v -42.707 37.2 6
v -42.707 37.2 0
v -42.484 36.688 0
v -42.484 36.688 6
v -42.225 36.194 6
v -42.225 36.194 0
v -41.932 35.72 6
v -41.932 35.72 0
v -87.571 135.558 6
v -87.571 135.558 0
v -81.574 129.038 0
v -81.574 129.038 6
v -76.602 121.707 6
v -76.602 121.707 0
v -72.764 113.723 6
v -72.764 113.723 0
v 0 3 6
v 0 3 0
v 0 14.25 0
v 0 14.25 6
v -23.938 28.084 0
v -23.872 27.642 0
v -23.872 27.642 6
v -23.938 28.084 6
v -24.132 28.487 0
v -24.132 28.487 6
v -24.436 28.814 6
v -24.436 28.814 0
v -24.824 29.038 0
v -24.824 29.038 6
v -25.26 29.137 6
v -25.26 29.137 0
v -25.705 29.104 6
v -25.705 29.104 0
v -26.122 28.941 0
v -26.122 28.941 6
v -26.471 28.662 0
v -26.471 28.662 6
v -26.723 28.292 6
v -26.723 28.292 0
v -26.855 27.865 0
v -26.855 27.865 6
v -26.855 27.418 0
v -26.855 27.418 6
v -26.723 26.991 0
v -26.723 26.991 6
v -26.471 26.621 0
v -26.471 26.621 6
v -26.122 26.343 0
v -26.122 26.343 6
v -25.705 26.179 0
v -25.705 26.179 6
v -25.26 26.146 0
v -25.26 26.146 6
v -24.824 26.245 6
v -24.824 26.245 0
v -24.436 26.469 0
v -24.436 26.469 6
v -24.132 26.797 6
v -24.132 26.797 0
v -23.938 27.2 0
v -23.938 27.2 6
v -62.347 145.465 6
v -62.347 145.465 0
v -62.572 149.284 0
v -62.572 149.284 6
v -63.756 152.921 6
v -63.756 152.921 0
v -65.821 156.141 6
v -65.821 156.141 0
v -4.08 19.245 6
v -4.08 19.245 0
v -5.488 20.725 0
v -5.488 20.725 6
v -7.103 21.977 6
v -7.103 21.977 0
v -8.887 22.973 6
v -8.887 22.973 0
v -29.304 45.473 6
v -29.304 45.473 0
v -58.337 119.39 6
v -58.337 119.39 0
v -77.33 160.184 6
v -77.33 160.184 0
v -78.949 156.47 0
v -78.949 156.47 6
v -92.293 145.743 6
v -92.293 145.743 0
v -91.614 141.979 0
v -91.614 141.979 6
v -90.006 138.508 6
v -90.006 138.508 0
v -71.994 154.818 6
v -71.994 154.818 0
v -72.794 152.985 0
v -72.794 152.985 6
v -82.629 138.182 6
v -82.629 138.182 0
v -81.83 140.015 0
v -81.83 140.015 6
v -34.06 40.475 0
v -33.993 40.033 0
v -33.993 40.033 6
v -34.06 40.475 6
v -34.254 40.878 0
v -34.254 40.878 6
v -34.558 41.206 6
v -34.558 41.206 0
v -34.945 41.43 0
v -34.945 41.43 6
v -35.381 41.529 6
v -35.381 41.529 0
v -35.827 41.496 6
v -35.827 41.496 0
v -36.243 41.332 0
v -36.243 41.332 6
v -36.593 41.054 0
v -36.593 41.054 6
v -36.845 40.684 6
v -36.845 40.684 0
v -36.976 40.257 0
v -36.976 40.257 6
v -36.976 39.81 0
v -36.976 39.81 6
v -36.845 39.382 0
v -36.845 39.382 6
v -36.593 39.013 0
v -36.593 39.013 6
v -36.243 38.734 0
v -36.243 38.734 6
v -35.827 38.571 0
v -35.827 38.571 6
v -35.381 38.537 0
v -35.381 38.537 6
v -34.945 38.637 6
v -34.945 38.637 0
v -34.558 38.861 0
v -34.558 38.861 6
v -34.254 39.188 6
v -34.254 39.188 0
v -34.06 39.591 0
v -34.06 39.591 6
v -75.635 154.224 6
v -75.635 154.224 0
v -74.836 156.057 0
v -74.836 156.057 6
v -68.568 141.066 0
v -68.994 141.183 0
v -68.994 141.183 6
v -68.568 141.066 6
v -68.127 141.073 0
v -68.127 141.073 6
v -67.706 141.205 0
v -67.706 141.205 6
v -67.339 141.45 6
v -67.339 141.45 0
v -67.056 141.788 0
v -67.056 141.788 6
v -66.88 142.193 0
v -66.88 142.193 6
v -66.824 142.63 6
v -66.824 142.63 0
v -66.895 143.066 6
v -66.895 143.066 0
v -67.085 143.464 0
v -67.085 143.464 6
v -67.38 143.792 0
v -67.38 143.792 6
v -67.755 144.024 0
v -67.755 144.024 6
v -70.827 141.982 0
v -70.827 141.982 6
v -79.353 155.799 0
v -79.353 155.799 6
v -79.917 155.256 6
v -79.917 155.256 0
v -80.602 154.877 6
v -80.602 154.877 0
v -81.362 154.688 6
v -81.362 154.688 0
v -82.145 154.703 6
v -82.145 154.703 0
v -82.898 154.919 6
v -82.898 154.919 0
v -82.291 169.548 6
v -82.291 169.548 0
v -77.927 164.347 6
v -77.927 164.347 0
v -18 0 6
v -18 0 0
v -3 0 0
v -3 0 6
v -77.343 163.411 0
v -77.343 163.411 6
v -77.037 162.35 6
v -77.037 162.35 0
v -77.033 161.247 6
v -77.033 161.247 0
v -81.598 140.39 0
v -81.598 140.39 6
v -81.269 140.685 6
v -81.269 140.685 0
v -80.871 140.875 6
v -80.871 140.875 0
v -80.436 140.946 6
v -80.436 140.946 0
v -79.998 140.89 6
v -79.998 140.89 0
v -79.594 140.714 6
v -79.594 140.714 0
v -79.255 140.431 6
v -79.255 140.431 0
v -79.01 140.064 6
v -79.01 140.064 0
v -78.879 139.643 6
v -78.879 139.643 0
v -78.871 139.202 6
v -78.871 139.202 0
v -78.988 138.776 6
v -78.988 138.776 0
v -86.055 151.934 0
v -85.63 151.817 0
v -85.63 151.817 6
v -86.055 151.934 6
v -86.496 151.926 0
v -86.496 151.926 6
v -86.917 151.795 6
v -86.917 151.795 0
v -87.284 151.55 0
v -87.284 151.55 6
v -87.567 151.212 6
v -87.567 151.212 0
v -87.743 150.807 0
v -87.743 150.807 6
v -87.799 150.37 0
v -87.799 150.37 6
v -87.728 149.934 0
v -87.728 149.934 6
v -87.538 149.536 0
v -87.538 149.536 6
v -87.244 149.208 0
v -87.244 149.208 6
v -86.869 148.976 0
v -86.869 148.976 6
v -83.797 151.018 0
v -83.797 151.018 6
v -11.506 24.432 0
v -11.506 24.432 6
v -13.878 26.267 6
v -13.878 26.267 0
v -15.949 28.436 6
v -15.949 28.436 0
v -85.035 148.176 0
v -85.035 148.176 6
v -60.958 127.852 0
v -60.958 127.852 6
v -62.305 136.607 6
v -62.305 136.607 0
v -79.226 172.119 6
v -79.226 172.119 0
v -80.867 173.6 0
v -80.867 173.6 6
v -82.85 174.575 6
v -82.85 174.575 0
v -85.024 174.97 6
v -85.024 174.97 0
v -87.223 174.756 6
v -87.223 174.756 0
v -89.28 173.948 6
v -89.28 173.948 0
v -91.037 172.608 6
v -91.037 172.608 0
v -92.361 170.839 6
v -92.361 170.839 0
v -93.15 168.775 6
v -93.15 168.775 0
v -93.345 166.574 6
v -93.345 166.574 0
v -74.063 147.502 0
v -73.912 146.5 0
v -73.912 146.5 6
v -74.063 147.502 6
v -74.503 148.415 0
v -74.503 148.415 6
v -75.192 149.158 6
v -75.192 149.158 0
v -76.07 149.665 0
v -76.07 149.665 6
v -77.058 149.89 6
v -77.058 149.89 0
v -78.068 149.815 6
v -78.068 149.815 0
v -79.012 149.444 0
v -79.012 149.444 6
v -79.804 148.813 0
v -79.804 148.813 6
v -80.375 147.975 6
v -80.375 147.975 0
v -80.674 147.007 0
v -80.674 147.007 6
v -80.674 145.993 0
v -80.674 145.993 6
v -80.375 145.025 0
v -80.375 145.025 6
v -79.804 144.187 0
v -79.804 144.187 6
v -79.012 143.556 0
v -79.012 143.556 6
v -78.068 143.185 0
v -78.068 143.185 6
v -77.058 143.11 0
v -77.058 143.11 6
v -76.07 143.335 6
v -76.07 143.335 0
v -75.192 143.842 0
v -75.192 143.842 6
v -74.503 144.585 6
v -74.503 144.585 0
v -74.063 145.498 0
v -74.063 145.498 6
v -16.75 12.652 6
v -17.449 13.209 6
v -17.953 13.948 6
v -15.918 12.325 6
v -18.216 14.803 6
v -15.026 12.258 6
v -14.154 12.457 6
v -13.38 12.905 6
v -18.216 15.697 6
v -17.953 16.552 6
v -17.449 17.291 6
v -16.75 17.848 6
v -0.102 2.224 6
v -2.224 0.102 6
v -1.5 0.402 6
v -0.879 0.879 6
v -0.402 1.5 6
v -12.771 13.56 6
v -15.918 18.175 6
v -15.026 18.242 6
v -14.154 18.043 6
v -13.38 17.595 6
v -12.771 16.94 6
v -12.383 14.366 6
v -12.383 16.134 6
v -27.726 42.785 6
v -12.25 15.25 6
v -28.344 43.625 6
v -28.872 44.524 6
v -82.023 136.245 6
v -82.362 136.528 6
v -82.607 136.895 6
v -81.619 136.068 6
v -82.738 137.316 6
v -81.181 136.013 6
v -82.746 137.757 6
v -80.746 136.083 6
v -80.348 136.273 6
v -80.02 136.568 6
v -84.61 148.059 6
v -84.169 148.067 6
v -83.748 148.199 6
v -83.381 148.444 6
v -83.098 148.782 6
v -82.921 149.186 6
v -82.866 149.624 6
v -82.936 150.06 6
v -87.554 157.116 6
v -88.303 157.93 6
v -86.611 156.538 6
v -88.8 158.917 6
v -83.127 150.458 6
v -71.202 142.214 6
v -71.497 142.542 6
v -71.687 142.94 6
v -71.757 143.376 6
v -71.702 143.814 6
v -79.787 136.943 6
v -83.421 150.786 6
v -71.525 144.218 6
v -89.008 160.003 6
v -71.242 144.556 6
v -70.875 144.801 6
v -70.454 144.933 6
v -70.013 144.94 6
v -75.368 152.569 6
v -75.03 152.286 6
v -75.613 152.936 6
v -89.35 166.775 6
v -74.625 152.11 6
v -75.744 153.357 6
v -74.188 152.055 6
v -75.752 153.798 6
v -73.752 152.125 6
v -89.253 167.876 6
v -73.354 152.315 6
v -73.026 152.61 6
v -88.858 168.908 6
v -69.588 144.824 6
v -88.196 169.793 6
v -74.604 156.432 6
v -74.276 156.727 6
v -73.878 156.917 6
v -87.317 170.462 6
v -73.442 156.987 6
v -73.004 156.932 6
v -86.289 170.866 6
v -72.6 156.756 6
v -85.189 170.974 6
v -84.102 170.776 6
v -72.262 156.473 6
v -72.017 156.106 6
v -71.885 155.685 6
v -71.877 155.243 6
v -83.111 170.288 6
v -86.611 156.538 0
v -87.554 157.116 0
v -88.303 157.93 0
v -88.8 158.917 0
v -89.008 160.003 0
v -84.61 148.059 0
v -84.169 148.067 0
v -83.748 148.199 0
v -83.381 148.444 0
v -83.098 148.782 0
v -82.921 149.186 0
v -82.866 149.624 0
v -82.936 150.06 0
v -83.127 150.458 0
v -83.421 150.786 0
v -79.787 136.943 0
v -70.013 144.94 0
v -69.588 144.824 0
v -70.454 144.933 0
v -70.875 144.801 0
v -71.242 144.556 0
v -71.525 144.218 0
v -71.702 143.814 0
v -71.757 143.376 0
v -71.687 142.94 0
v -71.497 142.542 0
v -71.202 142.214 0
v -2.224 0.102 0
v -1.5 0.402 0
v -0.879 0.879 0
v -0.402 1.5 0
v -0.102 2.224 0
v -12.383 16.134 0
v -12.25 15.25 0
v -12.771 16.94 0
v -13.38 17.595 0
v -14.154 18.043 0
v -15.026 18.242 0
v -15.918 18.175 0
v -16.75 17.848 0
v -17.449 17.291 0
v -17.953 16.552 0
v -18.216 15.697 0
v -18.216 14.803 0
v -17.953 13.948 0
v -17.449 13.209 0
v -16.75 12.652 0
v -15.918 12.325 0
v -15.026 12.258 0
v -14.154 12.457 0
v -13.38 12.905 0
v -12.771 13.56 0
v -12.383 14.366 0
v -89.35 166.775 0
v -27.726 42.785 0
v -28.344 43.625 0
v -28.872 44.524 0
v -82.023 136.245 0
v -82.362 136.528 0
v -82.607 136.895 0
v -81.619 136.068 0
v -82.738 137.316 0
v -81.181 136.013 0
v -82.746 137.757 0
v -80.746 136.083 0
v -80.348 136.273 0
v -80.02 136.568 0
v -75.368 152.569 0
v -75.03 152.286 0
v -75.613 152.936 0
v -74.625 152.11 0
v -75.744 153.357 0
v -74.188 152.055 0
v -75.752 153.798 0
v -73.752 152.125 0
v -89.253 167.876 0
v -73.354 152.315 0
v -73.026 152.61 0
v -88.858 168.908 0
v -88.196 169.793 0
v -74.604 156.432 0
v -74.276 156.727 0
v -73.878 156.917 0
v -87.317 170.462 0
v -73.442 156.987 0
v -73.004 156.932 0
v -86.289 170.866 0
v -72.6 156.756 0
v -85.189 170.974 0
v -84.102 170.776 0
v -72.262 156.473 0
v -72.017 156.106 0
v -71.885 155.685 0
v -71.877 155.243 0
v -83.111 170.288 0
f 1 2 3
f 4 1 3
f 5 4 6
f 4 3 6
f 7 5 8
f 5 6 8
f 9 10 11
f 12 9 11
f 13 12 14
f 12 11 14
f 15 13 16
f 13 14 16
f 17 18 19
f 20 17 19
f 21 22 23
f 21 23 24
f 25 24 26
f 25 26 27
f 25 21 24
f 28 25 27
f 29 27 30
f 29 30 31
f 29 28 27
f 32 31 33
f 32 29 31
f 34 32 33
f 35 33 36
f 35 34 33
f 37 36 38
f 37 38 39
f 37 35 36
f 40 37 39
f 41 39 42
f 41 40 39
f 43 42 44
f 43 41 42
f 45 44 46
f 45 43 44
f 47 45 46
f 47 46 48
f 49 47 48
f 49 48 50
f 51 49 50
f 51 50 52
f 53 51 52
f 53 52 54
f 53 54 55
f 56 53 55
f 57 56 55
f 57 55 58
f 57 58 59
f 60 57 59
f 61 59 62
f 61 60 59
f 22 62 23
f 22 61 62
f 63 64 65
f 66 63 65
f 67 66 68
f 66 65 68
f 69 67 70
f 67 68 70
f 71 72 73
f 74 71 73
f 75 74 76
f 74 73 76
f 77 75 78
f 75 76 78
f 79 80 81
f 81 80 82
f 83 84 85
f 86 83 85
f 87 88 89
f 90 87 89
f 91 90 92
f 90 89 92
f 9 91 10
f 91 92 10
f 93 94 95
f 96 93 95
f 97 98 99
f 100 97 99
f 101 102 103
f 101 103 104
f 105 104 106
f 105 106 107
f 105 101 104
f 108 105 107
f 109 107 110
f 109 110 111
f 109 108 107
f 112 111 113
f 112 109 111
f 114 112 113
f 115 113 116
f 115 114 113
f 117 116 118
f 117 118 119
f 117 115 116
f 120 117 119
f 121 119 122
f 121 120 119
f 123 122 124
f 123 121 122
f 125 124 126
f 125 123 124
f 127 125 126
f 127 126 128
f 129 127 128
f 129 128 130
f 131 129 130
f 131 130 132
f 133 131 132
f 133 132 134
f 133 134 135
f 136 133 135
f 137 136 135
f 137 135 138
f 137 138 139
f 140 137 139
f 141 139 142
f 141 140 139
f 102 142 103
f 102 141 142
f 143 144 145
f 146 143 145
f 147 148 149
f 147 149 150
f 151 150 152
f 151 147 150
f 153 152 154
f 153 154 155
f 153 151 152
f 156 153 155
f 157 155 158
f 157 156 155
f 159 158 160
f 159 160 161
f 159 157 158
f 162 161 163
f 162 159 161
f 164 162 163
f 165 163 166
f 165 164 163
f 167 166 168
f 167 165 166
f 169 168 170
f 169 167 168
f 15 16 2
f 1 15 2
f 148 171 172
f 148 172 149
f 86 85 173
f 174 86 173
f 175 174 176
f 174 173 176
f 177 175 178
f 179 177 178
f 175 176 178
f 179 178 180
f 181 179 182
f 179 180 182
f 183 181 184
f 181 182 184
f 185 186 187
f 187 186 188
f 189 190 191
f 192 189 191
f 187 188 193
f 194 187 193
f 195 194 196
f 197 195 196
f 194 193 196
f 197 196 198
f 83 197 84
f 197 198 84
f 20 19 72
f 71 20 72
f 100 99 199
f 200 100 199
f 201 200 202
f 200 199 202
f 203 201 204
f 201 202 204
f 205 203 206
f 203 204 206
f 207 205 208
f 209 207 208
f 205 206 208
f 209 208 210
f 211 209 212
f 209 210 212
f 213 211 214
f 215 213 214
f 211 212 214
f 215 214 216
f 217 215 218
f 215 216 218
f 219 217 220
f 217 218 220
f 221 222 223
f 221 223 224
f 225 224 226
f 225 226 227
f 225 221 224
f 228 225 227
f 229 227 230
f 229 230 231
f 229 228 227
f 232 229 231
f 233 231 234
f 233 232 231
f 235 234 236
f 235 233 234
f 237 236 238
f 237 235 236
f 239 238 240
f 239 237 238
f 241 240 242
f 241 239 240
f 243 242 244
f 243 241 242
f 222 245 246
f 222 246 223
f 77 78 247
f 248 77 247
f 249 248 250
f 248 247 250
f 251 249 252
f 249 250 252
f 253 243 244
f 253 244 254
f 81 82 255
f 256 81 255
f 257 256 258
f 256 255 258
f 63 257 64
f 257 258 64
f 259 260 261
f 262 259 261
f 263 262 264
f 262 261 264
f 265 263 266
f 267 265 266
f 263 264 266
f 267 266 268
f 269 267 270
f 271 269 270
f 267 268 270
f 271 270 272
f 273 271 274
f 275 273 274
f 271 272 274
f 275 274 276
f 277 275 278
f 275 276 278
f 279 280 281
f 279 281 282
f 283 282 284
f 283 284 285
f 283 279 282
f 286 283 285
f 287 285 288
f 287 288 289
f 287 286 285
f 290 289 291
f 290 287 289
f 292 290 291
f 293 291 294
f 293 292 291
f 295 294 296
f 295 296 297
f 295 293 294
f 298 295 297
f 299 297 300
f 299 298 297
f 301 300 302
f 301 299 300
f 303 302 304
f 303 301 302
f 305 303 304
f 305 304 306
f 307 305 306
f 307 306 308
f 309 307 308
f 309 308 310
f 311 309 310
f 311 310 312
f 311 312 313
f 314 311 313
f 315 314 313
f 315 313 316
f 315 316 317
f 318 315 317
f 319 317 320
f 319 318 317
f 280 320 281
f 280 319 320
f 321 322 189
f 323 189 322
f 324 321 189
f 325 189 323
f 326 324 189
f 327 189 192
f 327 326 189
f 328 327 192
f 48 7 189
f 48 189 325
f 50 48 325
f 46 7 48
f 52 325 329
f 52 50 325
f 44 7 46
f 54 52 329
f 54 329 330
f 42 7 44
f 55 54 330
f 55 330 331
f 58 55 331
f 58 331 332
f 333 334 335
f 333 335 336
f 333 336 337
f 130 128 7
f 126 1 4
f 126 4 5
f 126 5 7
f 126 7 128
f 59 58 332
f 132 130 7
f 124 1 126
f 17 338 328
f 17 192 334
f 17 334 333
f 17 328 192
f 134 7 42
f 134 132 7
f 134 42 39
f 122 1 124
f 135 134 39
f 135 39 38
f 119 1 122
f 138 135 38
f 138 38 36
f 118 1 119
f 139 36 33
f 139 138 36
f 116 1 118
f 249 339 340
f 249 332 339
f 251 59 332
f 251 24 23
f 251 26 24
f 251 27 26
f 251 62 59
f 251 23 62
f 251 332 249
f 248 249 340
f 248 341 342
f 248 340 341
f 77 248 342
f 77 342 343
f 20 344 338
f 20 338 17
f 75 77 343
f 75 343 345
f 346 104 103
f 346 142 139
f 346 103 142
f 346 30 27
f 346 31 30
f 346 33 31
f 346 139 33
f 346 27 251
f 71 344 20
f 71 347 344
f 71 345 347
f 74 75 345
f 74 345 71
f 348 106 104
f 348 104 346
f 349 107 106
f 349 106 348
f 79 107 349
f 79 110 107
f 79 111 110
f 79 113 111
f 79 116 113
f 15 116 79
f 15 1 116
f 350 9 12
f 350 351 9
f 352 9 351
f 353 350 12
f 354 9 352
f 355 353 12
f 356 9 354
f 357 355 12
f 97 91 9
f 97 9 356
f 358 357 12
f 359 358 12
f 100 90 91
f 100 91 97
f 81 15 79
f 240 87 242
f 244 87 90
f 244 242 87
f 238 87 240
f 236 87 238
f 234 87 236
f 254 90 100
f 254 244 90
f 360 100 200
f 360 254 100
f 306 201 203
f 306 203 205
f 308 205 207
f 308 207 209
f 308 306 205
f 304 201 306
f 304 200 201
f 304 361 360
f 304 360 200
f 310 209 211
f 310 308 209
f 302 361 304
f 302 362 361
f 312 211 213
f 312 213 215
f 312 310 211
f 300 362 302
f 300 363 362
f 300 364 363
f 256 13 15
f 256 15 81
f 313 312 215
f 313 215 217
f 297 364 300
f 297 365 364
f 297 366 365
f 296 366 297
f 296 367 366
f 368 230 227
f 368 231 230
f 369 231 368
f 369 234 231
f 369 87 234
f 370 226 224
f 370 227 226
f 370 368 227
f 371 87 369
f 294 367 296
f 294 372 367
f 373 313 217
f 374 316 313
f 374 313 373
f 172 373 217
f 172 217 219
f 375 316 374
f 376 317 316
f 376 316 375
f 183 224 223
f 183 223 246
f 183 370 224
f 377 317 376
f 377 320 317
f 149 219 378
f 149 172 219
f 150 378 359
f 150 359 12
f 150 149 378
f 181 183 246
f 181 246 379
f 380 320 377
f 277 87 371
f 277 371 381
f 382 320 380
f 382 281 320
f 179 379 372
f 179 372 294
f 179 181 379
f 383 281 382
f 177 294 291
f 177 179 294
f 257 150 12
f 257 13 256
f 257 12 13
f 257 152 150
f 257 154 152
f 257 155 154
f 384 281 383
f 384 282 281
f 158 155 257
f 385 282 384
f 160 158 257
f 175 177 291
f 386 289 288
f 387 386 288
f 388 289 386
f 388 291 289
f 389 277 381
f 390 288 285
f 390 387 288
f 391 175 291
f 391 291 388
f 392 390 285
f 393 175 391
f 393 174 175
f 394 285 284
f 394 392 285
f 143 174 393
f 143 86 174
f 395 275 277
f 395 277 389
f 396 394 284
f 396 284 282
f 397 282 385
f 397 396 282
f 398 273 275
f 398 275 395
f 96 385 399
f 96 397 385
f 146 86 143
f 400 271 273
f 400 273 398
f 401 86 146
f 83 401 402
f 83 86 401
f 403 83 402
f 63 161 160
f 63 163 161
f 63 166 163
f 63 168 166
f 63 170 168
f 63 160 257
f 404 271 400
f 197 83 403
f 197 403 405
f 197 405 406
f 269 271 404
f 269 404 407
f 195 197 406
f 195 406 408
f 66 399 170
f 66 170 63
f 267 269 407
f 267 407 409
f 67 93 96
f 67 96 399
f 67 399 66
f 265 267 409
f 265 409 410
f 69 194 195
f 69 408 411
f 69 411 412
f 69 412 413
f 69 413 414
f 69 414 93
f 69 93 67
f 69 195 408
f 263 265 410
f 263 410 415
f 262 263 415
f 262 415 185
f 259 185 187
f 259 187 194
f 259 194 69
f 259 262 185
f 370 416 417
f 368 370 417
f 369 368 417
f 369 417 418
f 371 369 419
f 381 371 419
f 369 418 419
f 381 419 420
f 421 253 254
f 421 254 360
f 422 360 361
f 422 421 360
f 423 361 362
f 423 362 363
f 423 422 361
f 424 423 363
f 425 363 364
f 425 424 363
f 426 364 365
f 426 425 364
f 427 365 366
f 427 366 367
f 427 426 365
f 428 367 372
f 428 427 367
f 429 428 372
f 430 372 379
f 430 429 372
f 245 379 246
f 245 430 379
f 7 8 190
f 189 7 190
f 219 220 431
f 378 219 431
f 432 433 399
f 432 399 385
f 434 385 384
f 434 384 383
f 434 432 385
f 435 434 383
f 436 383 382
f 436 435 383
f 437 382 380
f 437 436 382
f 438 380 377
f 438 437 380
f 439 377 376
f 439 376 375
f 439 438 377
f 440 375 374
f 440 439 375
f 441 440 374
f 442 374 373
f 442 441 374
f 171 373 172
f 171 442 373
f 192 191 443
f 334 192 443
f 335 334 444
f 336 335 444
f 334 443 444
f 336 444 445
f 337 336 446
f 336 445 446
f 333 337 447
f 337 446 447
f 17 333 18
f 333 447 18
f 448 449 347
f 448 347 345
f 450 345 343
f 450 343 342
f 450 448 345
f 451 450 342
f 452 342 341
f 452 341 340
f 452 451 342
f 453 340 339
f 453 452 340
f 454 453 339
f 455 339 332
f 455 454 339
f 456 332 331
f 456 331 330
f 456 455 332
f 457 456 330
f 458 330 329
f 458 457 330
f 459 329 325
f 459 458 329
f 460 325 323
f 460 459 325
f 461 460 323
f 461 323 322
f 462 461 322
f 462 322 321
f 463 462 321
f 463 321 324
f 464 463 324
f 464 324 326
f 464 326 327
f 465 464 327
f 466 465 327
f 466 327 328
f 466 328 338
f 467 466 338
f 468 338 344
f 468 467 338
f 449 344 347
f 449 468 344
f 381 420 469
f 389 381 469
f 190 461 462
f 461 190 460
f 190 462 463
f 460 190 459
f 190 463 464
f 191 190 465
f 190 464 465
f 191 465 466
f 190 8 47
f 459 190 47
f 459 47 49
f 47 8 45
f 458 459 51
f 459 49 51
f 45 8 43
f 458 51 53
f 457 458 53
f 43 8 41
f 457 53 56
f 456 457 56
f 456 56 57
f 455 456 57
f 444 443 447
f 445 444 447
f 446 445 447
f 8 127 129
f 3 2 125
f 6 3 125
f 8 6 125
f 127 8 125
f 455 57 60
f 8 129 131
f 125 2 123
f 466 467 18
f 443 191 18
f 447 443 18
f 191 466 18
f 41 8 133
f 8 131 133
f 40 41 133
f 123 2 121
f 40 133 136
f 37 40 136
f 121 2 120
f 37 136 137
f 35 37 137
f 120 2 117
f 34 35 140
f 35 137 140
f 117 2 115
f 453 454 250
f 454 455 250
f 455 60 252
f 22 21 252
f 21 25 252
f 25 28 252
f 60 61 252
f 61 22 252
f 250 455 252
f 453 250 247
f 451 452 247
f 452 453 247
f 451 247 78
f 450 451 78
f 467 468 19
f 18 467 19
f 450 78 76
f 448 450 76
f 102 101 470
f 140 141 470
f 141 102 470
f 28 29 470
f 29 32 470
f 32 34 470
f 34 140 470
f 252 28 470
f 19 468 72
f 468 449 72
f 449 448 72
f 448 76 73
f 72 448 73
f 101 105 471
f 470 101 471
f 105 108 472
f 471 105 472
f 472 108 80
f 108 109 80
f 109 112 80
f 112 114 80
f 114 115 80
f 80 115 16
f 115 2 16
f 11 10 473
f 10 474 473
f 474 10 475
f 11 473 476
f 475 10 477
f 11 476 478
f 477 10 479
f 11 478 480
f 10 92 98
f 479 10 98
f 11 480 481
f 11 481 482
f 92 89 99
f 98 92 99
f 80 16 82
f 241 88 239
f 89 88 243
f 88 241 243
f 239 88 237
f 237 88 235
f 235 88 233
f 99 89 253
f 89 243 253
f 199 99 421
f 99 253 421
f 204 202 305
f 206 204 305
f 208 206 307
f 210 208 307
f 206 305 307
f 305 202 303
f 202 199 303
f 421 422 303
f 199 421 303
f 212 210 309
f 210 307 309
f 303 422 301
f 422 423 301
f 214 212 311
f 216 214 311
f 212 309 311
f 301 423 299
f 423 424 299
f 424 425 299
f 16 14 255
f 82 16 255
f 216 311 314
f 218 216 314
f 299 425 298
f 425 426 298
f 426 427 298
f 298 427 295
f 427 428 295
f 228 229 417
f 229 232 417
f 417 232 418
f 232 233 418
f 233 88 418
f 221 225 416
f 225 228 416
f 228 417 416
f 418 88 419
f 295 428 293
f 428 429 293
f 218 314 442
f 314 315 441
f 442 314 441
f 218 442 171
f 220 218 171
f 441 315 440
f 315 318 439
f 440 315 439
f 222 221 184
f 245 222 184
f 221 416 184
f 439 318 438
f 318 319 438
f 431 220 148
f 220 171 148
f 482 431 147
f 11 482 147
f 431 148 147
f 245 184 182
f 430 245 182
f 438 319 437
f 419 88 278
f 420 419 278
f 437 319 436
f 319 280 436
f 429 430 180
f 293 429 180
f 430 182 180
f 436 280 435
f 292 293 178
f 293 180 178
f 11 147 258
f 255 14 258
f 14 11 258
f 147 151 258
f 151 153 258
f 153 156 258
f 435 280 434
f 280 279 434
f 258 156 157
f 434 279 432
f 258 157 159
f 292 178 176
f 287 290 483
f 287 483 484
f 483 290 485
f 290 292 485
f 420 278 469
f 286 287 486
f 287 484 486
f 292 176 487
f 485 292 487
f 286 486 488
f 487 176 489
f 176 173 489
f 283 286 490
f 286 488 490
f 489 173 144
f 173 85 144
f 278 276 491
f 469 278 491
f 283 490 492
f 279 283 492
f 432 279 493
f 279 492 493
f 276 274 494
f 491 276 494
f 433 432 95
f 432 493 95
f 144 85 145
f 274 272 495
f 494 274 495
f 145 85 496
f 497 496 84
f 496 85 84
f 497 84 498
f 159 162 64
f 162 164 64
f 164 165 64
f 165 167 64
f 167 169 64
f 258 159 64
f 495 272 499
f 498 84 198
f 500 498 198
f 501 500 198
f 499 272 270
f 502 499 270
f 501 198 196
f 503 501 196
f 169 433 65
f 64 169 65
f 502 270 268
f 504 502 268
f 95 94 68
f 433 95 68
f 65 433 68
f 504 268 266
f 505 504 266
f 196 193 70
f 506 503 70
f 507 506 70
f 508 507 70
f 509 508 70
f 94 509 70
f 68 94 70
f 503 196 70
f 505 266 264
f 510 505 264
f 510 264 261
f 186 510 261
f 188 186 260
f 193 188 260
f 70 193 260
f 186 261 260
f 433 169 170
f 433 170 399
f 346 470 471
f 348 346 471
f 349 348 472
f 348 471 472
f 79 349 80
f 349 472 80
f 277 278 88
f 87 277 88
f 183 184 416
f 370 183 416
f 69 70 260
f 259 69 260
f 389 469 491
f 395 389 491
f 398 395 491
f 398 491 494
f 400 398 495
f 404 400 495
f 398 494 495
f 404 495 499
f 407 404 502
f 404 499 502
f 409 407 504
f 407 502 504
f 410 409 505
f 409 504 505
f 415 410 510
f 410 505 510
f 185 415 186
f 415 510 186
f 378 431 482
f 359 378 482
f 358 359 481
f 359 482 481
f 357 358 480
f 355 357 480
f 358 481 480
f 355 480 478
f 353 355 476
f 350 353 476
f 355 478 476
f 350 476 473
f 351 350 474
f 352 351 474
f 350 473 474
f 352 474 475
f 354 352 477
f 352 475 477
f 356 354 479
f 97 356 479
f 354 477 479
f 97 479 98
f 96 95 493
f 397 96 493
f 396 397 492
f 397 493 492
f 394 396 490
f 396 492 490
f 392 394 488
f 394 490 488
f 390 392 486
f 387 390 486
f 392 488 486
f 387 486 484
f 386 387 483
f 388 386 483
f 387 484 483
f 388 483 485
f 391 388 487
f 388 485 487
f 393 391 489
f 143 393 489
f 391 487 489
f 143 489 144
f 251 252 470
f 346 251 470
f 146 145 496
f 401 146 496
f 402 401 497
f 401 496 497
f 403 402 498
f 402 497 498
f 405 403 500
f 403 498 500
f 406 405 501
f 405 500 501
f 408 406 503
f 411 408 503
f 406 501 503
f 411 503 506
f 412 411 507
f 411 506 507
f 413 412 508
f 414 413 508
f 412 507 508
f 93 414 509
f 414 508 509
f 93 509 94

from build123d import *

# Parameters (mm, degrees)
CROQUIS1_R              = 3.4
CROQUIS1_R_2            = 3
CROQUIS1_R_3            = 1.5
CROQUIS1_R_4            = 1.500001004
SALIENTE_EXTRUIR1_DEPTH = 6


with BuildPart() as part:
    # Croquis1 → Saliente-Extruir1 (new body)
    with BuildSketch(Plane.XY):
        with BuildLine():
            Line((-29.303608517, 45.473325839), (-58.336924517, 119.389926839))
            ThreePointArc((-58.336924517, 119.389926839), (-61.793103757, 132.204361213), (-62.347490923, 145.46511376))
            ThreePointArc((-62.347490923, 145.46511376), (-63.047561651, 151.140362617), (-65.820602243, 156.141241988))
            Line((-65.820602243, 156.141241988), (-79.226205243, 172.119032988))
            ThreePointArc((-79.226205243, 172.119032988), (-88.279569401, 174.423233147), (-93.344634593, 166.573528977))
            Line((-93.344634593, 166.573528977), (-92.292655243, 145.743421988))
            ThreePointArc((-92.292655243, 145.743421988), (-90.920958081, 140.192116496), (-87.571476882, 135.557516032))
            ThreePointArc((-87.571476882, 135.557516032), (-78.952780907, 125.464301499), (-72.763926988, 113.723220326))
            Line((-72.763926988, 113.723220326), (-42.706743988, 37.199930326))
            ThreePointArc((-42.706743988, 37.199930326), (-42.359256153, 36.438795137), (-41.931739661, 35.719556497))
            Line((-41.931739661, 35.719556497), (-17.999999661, 4.97e-07))
            Line((-17.999999661, 4.97e-07), (-2.999999661, 4.97e-07))
            ThreePointArc((-2.999999661, 4.97e-07), (-0.878679318, 0.878680154), (3.39e-07, 3.000000497))
            Line((3.39e-07, 3.000000497), (3.39e-07, 14.250000497))
            Line((3.39e-07, 14.250000497), (-4.079708661, 19.244683497))
            ThreePointArc((-4.079708661, 19.244683497), (-6.27155818, 21.381766981), (-8.886999737, 22.972614423))
            ThreePointArc((-8.886999737, 22.972614423), (-12.726828858, 25.305121653), (-15.949120882, 28.435890212))
            Line((-15.949120882, 28.435890212), (-27.725819882, 42.785152212))
            ThreePointArc((-27.725819882, 42.785152212), (-28.620096035, 44.067386525), (-29.303608517, 45.473325839))
        make_face()
        with Locations((-77.311748512, 146.499999762)):
            Circle(CROQUIS1_R, mode=Mode.SUBTRACT)
        with Locations((-15.25, 15.25)):
            Circle(CROQUIS1_R_2, mode=Mode.SUBTRACT)
        with Locations((-25.371621, 27.641642)):
            Circle(CROQUIS1_R_3, mode=Mode.SUBTRACT)
        with Locations((-35.49324282, 40.033285892)):
            Circle(CROQUIS1_R_4, mode=Mode.SUBTRACT)
        with BuildLine():
            Line((-71.99439, 154.818095), (-72.793676, 152.984753))
            ThreePointArc((-72.793676, 152.984753), (-74.833795849, 152.18374175), (-75.635356, 154.223646))
            Line((-75.635356, 154.223646), (-74.836069921, 156.056987462))
            ThreePointArc((-74.836069921, 156.056987462), (-72.795783729, 156.858381191), (-71.99439, 154.818095))
        make_face(mode=Mode.SUBTRACT)
        with BuildLine():
            Line((-86.868735462, 148.975678079), (-85.035394, 148.176392))
            ThreePointArc((-85.035394, 148.176392), (-82.9951075, 148.9777855), (-83.796501, 151.018072))
            Line((-83.796501, 151.018072), (-85.629843, 151.817358))
            ThreePointArc((-85.629843, 151.817358), (-87.669747153, 151.015797712), (-86.868735462, 148.975678079))
        make_face(mode=Mode.SUBTRACT)
        with BuildLine():
            Line((-67.754760538, 144.024321921), (-69.588102, 144.823608))
            ThreePointArc((-69.588102, 144.823608), (-71.62800625, 144.022047849), (-70.826995, 141.981928))
            Line((-70.826995, 141.981928), (-68.993653, 141.182642))
            ThreePointArc((-68.993653, 141.182642), (-66.953366809, 141.98403573), (-67.754760538, 144.024321921))
        make_face(mode=Mode.SUBTRACT)
        with BuildLine():
            Line((-82.89780493, 154.919280048), (-86.61137993, 156.538295048))
            ThreePointArc((-86.61137993, 156.538295048), (-88.302670061, 157.929718336), (-89.007717, 160.003225))
            Line((-89.007717, 160.003225), (-89.349725675, 166.775282995))
            ThreePointArc((-89.349725675, 166.775282995), (-86.817213433, 170.700127324), (-82.290539057, 169.548068144))
            Line((-82.290539057, 169.548068144), (-77.926769806, 164.347120835))
            ThreePointArc((-77.926769806, 164.347120835), (-77.036994499, 162.350360642), (-77.32981093, 160.184025048))
            Line((-77.32981093, 160.184025048), (-78.94886318, 156.470364412))
            ThreePointArc((-78.94886318, 156.470364412), (-80.602093919, 154.876969498), (-82.89780493, 154.919280048))
        make_face(mode=Mode.SUBTRACT)
        with BuildLine():
            Line((-82.629106, 138.181905), (-81.82982, 140.015247))
            ThreePointArc((-81.82982, 140.015247), (-79.7895335, 140.8166405), (-78.98814, 138.776354))
            Line((-78.98814, 138.776354), (-79.787426079, 136.943012538))
            ThreePointArc((-79.787426079, 136.943012538), (-81.827545712, 136.142000847), (-82.629106, 138.181905))
        make_face(mode=Mode.SUBTRACT)
    extrude(amount=SALIENTE_EXTRUIR1_DEPTH)


solid = part.part
